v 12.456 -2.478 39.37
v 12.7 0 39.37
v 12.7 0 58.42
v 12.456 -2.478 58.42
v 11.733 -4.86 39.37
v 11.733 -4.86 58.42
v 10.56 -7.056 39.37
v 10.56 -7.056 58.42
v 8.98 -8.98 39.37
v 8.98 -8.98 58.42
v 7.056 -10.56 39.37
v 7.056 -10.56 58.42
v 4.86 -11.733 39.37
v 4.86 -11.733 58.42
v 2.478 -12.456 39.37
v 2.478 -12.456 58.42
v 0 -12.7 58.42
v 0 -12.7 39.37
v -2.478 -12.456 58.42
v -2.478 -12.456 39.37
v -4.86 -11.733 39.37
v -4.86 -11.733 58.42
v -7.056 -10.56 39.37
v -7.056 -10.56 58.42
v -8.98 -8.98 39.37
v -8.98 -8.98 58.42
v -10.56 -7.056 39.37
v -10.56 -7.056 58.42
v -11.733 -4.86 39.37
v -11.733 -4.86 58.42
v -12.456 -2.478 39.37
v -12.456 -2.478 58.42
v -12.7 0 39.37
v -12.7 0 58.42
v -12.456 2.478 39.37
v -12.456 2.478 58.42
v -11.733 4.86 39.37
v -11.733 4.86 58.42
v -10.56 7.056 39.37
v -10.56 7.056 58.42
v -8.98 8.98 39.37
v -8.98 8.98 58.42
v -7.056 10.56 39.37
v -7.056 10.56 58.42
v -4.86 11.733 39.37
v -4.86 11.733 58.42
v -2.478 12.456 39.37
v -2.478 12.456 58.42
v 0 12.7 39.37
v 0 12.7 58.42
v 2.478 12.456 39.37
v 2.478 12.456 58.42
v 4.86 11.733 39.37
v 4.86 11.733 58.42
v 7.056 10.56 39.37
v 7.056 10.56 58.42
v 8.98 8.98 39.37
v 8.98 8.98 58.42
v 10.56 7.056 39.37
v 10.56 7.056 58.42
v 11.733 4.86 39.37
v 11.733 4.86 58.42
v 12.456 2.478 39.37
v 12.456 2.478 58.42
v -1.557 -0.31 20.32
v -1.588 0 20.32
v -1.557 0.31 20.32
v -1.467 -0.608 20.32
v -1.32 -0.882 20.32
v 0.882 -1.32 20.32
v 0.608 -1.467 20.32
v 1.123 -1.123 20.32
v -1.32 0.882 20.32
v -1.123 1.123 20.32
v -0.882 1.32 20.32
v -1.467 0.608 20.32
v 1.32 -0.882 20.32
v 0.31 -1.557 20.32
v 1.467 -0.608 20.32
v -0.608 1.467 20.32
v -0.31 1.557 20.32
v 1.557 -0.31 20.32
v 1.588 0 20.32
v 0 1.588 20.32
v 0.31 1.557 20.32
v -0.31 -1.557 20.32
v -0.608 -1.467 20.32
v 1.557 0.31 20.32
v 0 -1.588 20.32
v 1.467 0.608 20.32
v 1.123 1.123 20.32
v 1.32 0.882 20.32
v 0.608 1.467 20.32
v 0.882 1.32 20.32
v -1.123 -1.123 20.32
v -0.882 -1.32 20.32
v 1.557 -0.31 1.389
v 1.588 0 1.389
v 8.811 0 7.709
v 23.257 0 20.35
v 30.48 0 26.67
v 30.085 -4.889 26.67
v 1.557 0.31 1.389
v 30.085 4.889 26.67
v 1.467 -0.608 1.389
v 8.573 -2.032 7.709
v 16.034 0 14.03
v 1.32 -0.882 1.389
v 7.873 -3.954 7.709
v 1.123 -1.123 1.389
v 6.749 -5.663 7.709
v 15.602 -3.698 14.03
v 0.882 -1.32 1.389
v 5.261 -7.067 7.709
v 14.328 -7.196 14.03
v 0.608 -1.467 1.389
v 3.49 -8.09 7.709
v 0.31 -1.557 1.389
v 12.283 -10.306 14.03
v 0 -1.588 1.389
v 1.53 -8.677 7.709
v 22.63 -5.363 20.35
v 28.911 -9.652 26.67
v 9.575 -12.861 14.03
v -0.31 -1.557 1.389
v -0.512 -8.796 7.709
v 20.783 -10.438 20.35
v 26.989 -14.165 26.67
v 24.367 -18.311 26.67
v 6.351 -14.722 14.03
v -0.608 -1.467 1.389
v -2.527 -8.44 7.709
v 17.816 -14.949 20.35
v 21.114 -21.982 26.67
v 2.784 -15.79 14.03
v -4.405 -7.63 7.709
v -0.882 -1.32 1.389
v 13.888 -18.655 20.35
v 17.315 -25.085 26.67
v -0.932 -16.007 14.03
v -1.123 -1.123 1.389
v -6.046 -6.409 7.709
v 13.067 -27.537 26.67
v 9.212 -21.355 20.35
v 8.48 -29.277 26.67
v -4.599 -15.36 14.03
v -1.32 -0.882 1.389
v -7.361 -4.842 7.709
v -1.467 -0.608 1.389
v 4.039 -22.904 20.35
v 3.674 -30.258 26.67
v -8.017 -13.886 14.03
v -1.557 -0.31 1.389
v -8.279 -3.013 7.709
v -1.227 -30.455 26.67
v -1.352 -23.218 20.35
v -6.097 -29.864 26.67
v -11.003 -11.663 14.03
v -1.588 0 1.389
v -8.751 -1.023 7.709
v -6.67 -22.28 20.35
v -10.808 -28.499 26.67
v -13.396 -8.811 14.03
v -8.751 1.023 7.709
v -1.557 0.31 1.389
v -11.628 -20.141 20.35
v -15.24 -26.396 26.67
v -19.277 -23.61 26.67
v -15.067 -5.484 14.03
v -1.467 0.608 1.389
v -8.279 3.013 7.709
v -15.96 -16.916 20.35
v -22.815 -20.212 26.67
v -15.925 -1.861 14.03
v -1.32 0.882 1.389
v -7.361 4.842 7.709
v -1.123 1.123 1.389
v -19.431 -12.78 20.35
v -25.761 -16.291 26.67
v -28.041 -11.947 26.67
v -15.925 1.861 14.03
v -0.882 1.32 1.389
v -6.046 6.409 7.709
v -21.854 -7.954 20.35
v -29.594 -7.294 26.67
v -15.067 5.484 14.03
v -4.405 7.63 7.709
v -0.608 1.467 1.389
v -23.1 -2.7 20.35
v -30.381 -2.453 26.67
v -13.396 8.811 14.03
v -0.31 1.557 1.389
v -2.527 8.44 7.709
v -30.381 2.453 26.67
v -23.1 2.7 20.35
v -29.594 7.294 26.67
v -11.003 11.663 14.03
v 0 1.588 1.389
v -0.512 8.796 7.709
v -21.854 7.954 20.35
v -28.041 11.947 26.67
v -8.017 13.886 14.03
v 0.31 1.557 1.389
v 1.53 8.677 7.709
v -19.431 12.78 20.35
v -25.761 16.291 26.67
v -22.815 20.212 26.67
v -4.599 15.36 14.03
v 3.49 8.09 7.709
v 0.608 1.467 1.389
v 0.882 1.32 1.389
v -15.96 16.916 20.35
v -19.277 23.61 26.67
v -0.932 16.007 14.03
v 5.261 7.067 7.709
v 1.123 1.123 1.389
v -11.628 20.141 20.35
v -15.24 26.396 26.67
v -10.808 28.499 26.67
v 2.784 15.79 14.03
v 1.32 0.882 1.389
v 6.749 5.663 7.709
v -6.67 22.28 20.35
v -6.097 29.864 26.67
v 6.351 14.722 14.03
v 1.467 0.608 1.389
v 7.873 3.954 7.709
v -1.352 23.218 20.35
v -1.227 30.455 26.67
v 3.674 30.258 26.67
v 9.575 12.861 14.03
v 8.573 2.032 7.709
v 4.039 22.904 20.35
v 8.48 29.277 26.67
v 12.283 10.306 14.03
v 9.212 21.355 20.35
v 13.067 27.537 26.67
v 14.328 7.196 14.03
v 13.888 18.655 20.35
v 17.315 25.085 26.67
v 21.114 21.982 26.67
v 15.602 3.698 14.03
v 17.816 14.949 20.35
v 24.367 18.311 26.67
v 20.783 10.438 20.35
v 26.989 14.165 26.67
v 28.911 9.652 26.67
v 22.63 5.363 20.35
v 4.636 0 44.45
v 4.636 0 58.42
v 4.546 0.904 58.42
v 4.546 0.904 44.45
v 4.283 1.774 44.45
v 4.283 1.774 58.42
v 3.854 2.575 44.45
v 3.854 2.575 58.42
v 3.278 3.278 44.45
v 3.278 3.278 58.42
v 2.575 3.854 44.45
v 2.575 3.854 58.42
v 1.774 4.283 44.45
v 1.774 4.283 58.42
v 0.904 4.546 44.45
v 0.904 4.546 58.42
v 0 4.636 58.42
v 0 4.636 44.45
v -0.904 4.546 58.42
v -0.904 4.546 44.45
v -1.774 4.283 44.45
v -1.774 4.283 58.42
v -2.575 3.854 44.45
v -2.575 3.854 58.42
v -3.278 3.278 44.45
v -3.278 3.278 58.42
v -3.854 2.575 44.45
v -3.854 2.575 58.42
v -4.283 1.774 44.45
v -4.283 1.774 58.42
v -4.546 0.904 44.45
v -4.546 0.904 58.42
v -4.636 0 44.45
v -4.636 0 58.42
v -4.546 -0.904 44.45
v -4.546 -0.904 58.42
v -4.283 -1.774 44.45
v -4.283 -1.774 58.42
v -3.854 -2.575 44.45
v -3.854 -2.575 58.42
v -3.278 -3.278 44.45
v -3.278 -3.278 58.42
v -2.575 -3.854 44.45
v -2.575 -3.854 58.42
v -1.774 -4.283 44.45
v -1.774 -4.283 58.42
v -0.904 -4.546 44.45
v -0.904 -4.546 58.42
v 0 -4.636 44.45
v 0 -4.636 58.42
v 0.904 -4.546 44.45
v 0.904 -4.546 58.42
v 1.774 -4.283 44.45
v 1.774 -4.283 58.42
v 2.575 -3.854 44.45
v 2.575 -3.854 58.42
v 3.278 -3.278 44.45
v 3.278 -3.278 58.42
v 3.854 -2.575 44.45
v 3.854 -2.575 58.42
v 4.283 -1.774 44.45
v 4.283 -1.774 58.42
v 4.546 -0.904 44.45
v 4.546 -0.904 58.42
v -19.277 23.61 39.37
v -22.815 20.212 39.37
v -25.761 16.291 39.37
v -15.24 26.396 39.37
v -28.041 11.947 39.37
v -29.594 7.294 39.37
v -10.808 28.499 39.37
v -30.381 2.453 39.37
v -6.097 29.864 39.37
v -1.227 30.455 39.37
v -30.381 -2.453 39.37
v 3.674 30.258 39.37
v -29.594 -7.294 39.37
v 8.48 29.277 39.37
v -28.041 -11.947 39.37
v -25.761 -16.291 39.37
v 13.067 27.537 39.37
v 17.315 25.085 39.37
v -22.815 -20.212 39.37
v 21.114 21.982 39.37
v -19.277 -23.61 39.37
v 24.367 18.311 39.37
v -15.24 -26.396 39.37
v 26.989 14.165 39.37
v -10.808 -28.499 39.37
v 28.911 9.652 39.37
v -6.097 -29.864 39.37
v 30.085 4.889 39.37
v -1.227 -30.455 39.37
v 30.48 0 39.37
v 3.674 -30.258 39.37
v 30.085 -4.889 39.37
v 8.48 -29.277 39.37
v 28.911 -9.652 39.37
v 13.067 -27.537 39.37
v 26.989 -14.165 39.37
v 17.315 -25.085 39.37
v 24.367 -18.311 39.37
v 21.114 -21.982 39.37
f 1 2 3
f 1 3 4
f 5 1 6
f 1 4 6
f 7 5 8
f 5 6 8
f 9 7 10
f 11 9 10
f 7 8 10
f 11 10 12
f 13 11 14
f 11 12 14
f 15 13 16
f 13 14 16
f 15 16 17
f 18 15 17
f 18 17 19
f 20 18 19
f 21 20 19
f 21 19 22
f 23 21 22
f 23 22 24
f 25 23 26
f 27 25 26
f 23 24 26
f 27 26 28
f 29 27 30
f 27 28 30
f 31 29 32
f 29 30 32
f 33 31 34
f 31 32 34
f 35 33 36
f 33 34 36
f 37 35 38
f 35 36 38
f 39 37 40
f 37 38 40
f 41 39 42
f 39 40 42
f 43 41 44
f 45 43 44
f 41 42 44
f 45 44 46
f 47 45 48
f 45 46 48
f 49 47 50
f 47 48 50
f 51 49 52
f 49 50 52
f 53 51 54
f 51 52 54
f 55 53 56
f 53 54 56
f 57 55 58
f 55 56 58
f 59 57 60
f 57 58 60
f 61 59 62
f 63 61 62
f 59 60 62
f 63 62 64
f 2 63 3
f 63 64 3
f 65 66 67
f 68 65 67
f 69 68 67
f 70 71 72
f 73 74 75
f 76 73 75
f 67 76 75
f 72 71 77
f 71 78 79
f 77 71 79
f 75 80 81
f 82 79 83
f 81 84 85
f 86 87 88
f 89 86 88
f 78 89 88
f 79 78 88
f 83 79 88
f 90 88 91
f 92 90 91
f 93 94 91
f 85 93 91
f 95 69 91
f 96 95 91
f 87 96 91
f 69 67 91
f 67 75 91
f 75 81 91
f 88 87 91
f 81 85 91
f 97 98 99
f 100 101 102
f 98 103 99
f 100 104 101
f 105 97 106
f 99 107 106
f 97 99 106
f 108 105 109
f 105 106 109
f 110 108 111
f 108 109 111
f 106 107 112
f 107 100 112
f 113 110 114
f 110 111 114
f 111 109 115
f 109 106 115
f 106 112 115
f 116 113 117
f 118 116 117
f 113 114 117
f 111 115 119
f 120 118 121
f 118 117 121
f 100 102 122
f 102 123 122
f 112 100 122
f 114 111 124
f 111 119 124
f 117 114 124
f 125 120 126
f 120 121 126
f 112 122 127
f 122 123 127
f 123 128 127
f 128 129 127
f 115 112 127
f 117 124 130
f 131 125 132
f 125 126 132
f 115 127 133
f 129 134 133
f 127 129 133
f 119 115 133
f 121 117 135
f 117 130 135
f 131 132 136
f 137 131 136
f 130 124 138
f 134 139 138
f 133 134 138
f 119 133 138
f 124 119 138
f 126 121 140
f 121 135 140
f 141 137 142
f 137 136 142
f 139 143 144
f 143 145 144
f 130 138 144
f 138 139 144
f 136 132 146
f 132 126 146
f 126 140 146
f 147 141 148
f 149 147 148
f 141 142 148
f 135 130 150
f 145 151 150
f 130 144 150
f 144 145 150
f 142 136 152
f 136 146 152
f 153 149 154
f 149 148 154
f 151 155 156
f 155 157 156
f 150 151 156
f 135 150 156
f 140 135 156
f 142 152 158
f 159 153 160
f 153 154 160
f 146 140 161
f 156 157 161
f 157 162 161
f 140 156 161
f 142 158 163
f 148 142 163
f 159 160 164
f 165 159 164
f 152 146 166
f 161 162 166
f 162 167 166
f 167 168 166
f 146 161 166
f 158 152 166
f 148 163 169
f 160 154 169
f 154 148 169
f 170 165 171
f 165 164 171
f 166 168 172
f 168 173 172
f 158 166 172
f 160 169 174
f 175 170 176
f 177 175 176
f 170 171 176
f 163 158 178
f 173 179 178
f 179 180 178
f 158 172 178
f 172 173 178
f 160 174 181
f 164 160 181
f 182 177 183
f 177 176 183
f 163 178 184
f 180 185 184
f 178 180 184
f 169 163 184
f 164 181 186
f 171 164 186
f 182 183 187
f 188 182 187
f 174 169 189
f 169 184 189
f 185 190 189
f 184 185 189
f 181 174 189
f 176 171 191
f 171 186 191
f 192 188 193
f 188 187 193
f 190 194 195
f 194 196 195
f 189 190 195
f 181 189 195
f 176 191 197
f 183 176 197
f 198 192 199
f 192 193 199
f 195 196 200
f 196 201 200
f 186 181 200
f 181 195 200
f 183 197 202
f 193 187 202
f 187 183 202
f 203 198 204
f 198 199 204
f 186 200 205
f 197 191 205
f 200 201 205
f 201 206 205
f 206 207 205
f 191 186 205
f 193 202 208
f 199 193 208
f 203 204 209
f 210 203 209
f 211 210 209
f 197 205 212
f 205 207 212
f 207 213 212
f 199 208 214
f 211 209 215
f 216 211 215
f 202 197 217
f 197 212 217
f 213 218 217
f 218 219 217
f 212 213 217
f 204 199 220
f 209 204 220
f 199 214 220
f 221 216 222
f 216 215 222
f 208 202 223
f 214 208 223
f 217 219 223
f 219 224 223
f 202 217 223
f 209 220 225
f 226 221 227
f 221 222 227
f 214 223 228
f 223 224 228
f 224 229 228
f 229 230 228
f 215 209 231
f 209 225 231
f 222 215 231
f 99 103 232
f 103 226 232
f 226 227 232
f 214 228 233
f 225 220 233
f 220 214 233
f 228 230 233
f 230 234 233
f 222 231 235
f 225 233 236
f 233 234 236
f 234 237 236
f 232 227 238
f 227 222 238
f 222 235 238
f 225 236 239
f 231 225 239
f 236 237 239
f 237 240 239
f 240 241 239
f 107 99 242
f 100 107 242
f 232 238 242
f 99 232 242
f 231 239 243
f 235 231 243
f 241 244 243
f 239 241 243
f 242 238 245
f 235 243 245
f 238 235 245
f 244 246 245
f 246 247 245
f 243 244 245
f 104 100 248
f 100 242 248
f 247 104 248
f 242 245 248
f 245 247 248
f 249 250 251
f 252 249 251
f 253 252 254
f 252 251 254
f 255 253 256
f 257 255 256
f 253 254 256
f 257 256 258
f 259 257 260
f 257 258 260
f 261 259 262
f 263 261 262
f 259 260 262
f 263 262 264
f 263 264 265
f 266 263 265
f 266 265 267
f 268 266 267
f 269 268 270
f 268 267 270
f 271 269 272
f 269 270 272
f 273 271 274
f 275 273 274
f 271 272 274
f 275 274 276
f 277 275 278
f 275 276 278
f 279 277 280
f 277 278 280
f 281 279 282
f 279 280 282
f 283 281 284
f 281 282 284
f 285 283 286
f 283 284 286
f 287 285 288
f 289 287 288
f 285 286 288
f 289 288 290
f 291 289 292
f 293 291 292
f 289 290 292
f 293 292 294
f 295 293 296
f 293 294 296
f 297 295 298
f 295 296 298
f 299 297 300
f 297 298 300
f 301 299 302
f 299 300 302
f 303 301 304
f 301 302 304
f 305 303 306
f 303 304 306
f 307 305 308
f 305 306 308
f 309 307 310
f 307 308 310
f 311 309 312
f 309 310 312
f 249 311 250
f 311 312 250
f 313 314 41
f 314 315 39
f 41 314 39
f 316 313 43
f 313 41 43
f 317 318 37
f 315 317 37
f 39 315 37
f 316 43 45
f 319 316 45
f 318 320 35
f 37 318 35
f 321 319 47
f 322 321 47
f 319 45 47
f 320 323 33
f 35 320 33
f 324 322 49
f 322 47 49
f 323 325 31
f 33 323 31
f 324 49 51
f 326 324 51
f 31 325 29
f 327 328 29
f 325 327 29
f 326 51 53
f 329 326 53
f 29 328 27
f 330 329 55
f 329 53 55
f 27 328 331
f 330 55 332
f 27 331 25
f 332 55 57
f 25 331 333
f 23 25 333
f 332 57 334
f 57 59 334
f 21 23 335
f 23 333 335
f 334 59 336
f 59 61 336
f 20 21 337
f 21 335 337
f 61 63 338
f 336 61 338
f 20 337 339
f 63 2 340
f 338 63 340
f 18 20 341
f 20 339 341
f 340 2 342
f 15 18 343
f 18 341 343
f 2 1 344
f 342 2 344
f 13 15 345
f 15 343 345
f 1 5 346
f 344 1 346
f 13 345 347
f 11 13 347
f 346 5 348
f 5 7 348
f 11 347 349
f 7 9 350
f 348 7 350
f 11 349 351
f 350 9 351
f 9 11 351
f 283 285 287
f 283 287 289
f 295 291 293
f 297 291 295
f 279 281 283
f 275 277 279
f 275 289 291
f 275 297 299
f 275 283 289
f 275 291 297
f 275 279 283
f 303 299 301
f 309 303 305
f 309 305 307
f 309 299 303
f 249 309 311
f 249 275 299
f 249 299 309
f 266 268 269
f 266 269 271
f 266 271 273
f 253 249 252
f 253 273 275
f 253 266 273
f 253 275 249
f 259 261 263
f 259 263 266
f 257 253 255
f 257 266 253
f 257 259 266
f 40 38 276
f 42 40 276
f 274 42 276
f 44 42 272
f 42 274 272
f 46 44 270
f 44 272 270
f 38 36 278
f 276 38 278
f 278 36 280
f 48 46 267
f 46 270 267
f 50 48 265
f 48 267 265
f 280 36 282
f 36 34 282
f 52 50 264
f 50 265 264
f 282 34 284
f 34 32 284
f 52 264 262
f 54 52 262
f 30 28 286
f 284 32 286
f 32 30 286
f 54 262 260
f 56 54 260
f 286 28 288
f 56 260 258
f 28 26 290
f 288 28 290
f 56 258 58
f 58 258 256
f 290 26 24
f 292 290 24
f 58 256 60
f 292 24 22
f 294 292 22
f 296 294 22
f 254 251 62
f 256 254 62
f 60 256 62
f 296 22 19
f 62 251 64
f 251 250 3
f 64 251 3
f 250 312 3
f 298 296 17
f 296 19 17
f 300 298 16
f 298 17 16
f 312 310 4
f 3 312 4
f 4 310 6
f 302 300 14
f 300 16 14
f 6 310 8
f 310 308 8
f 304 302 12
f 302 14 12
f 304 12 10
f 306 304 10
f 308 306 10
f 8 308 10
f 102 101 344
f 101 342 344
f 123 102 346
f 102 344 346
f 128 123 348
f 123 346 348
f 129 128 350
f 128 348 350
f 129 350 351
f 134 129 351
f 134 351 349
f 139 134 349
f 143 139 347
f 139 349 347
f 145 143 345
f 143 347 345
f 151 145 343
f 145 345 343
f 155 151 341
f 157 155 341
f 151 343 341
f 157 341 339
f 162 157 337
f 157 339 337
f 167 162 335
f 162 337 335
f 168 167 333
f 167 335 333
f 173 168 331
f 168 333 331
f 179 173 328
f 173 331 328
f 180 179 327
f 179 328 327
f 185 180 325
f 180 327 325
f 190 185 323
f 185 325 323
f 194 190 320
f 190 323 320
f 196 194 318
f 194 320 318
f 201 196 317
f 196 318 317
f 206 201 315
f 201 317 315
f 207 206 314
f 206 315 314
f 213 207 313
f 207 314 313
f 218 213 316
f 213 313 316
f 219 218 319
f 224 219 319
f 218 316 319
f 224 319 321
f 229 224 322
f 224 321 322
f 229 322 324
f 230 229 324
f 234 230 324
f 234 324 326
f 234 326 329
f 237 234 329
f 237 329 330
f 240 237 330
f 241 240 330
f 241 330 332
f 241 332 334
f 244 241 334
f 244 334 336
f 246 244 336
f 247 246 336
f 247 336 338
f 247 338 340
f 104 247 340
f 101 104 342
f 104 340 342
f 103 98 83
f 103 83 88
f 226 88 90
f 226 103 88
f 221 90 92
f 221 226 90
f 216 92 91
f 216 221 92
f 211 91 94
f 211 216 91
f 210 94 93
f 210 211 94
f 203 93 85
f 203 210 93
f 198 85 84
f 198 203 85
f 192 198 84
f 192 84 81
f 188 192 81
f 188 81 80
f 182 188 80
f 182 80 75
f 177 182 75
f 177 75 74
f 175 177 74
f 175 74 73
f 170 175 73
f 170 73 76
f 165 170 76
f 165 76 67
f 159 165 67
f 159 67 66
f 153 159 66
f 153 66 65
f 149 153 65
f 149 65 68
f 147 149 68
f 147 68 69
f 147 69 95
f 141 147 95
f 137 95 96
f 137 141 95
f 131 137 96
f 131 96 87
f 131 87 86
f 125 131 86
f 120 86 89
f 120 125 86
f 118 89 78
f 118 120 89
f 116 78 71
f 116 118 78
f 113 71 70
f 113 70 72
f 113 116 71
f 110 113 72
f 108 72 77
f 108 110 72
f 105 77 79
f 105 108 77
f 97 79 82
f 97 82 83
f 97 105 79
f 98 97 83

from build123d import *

# Parameters (mm, degrees)
F2_R     = 4.6355
F3_DEPTH = 13.97
F4_R     = 1.5875
F5_DEPTH = 20.32


with BuildPart() as f1:
    # F0 (on Front) → F1 (revolve)
    with BuildSketch(Plane.XZ):
        Polygon((0, 58.42), (0, 0), (30.48, 26.67), (30.48, 39.37), (12.7, 39.37), (12.7, 58.42), align=None)
    revolve(axis=Axis((0, 0, 29.21), (0, 0, -1)))

    # F2 (on face) → F3 (cut)
    with BuildSketch(Plane.XY.offset(58.42)):
        Circle(F2_R)
    extrude(amount=-F3_DEPTH, mode=Mode.SUBTRACT)

    # F4 (on Top) → F5 (cut)
    with BuildSketch(Plane.XY):
        Circle(F4_R)
    extrude(amount=F5_DEPTH, mode=Mode.SUBTRACT)


solid = f1.part
